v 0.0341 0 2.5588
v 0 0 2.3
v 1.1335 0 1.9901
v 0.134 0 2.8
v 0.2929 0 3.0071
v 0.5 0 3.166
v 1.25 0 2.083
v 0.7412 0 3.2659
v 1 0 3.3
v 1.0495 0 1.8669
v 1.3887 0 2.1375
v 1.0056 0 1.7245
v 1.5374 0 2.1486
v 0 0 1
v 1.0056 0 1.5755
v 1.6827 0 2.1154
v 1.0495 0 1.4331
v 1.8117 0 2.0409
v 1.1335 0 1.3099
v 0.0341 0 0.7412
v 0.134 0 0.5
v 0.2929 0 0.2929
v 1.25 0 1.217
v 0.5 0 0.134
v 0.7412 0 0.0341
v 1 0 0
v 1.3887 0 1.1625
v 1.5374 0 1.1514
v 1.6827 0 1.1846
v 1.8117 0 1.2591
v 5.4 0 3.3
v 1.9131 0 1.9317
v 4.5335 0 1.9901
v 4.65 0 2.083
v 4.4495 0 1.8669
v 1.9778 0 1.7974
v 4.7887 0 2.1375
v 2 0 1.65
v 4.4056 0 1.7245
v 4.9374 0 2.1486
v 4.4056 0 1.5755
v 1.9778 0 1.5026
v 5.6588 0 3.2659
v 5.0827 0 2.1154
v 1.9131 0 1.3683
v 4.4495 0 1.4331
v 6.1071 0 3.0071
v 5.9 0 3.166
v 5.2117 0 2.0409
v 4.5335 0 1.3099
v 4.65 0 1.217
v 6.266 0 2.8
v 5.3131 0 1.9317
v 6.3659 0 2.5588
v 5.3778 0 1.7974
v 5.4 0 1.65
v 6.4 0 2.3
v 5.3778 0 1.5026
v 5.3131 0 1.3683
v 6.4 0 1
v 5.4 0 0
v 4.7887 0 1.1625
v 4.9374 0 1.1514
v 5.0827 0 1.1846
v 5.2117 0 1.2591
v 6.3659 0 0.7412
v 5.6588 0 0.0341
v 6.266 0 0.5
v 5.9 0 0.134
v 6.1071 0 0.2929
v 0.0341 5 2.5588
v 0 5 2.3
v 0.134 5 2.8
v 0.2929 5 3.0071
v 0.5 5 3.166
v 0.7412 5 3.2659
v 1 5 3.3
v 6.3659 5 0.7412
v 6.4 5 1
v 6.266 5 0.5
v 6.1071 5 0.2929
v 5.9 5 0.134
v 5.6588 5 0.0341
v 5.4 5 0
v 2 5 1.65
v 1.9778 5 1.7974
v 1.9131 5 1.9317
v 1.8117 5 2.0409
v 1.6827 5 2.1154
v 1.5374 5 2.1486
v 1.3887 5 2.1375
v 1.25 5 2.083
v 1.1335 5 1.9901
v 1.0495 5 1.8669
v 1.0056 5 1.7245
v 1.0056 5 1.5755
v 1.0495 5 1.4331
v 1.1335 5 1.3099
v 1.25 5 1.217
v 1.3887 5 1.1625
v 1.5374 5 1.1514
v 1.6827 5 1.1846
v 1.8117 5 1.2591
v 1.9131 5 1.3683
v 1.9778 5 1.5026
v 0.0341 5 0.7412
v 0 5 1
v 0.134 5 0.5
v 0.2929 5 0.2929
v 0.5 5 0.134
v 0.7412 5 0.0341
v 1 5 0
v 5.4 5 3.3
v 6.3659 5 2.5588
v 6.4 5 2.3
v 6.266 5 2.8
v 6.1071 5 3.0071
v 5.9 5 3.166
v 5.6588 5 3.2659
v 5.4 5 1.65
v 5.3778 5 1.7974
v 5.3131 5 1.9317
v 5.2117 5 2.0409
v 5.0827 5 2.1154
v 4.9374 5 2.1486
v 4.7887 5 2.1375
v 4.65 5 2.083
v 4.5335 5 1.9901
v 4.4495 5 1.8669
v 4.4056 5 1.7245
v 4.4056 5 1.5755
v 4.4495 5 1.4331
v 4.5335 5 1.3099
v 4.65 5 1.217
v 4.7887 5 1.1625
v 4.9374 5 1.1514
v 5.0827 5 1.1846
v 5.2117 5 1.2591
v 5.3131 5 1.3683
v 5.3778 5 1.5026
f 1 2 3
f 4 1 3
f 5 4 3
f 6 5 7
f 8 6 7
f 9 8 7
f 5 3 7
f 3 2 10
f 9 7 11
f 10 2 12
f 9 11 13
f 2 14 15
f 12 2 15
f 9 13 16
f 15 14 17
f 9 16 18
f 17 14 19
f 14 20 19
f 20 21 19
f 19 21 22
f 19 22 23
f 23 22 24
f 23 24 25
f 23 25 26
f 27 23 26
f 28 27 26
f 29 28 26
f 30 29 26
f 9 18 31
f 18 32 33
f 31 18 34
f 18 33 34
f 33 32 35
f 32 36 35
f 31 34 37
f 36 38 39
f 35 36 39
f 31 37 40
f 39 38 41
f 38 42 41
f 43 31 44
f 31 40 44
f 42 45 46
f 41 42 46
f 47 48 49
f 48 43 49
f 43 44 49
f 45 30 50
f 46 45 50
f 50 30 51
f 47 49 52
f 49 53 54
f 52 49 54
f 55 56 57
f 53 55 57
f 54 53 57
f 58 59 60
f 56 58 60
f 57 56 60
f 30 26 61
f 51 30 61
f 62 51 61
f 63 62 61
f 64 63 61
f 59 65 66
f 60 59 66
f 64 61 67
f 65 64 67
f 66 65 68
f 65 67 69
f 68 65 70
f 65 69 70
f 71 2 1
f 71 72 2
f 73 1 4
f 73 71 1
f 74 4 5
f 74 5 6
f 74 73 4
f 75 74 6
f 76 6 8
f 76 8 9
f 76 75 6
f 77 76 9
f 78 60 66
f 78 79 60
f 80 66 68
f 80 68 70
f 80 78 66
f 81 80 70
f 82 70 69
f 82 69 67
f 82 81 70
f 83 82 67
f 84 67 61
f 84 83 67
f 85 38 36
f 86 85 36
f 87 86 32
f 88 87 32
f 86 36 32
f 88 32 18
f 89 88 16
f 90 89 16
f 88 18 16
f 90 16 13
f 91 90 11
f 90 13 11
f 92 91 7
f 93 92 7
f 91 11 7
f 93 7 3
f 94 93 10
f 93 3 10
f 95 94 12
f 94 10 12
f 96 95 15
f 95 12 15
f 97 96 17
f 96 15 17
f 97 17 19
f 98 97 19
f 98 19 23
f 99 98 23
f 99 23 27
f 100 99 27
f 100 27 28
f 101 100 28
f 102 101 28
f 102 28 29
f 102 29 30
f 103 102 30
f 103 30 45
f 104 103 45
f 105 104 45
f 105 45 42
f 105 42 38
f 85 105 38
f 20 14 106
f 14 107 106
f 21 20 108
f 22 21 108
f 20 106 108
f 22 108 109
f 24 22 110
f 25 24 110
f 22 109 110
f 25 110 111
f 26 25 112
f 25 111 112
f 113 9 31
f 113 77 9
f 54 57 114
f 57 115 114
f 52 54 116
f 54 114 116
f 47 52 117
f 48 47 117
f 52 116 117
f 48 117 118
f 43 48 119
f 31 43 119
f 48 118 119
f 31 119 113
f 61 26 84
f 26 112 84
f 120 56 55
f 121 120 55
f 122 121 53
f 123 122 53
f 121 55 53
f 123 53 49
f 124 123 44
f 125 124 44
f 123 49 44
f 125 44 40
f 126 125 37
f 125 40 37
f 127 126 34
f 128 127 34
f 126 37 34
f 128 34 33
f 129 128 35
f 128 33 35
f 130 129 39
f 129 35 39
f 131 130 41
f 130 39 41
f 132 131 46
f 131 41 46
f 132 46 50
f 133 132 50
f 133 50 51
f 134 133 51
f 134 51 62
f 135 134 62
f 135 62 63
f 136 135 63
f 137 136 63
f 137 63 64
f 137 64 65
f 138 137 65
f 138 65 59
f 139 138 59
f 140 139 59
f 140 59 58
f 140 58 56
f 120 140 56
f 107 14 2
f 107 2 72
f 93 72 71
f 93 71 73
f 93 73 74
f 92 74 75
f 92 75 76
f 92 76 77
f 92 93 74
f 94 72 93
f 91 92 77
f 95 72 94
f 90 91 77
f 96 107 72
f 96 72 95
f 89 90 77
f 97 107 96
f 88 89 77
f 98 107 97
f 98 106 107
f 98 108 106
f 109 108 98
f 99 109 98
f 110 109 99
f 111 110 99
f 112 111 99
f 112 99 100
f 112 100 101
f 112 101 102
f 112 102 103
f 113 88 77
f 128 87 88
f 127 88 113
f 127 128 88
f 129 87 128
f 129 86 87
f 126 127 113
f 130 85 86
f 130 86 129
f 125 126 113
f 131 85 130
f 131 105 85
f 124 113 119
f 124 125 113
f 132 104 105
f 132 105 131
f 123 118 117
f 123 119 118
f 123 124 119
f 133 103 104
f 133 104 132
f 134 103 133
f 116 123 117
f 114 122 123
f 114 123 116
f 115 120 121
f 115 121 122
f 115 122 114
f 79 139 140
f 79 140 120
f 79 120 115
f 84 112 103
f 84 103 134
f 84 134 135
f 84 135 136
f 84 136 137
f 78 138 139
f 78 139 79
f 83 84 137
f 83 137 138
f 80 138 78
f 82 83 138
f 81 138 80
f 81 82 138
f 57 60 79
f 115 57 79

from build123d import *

# Parameters (mm, degrees)
F0_W     = 6.4
F0_H     = 5
F1_DEPTH = 3.3
F2_R     = 1
F3_R     = 0.5
F4_DEPTH = 5.001


with BuildPart() as f1:
    # F0 (on Top) → F1 (new body)
    with BuildSketch(Plane.XY):
        with Locations((3.2, 2.5)):
            Rectangle(F0_W, F0_H)
    extrude(amount=F1_DEPTH)

    # F2
    f2_edges = [f1.edges().sort_by_distance(p)[0] for p in [
        (0, 2.5, 3.3),
        (6.4, 2.5, 3.3),
        (6.4, 2.5, 0),
        (0, 2.5, 0),
    ]]
    fillet(f2_edges, radius=F2_R)

    # F3 (on face) → F4 (cut, through all)
    with BuildSketch(Plane.XZ):
        with Locations((1.5, 1.65)):
            Circle(F3_R)
        with Locations((4.9, 1.65)):
            Circle(F3_R)
    extrude(amount=-F4_DEPTH, mode=Mode.SUBTRACT)


solid = f1.part
